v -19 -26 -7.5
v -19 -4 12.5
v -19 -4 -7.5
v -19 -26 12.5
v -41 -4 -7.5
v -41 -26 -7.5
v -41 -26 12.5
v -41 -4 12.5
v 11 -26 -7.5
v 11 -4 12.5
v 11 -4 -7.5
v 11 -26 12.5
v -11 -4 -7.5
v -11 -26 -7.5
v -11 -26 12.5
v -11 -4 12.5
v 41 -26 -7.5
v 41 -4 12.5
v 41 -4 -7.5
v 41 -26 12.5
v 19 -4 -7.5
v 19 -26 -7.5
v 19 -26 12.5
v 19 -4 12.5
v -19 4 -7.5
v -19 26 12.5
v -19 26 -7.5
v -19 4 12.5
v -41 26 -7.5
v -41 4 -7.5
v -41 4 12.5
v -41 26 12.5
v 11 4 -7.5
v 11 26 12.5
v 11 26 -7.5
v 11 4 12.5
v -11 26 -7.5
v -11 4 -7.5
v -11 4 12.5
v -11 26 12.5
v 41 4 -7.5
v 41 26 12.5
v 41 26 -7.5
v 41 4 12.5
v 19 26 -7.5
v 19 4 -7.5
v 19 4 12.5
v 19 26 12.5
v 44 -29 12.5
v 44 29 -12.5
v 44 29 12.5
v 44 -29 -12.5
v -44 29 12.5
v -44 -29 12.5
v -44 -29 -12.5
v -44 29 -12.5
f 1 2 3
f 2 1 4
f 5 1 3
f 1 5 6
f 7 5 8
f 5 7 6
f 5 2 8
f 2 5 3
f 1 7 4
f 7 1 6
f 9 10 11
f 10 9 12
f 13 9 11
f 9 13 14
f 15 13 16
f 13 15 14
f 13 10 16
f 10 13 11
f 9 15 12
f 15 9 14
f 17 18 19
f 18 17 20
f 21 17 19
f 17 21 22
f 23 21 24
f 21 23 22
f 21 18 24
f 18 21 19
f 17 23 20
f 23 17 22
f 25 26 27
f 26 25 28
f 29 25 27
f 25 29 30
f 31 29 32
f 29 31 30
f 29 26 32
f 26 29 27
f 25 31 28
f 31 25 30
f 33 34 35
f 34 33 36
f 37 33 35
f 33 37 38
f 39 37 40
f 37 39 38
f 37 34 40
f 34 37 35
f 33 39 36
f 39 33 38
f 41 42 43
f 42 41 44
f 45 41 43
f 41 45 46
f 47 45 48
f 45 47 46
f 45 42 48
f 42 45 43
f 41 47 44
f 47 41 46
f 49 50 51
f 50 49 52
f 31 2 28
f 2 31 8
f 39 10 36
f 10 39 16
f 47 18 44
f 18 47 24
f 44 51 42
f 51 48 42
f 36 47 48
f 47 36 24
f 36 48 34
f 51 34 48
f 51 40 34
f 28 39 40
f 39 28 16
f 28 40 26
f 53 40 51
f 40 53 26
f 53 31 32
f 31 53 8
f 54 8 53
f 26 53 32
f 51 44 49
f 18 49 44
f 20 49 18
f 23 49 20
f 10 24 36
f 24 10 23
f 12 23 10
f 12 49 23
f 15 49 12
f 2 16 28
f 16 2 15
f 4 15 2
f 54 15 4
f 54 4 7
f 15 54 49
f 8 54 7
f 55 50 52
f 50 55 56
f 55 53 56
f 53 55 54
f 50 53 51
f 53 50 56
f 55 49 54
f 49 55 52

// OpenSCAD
$fn = 32;

// ----------------------------------------------------------------------
// Pocket plate 88 x 58 x 25
// 2 x 3 pockets 22 mm square, 20 mm deep
// ----------------------------------------------------------------------

// --- parameters (mm) ---
thickness = 25;  // plate thickness
floor_t = 5;     // material left under each pocket
pocket = 22;     // pocket side length
pitch_x = 30;    // pocket pitch along X
pitch_y = 30;    // pocket pitch along Y
cols = 3;        // pockets per row
rows = 2;        // rows of pockets

// --- derived feature positions (mm) ---
depth = thickness - floor_t;        // = 20   pocket depth, down to the floor
span_x = (cols - 1) * pitch_x;      // = 60   distance between outer pockets
span_y = (rows - 1) * pitch_y;      // = 30   distance between outer pocket rows
origin_x = -span_x / 2;             // = -30   X of the first pocket
origin_y = -span_y / 2;             // = -15   Y of the first pocket
plate = [span_x + pocket + 6, span_y + pocket + 6, thickness];  // = [88, 58, 25]   overall size: pockets plus 3 mm of wall on each side
feature_centers = [
  [origin_x + 0 * pitch_x, origin_y + 0 * pitch_y],
  [origin_x + 1 * pitch_x, origin_y + 0 * pitch_y],
  [origin_x + 2 * pitch_x, origin_y + 0 * pitch_y],
  [origin_x + 0 * pitch_x, origin_y + 1 * pitch_y],
  [origin_x + 1 * pitch_x, origin_y + 1 * pitch_y],
  [origin_x + 2 * pitch_x, origin_y + 1 * pitch_y]
];   // pocket centres, used verbatim by the cutter loop

// plate outline, then one pocket per centre in feature_centers
difference() {
  cube(plate, center = true);
  for (centre = feature_centers)
    translate([centre[0] - pocket / 2, centre[1] - pocket / 2, plate[2] / 2 - depth])
      cube([pocket, pocket, depth + 1]);  // centred on the declared pocket centre
}
